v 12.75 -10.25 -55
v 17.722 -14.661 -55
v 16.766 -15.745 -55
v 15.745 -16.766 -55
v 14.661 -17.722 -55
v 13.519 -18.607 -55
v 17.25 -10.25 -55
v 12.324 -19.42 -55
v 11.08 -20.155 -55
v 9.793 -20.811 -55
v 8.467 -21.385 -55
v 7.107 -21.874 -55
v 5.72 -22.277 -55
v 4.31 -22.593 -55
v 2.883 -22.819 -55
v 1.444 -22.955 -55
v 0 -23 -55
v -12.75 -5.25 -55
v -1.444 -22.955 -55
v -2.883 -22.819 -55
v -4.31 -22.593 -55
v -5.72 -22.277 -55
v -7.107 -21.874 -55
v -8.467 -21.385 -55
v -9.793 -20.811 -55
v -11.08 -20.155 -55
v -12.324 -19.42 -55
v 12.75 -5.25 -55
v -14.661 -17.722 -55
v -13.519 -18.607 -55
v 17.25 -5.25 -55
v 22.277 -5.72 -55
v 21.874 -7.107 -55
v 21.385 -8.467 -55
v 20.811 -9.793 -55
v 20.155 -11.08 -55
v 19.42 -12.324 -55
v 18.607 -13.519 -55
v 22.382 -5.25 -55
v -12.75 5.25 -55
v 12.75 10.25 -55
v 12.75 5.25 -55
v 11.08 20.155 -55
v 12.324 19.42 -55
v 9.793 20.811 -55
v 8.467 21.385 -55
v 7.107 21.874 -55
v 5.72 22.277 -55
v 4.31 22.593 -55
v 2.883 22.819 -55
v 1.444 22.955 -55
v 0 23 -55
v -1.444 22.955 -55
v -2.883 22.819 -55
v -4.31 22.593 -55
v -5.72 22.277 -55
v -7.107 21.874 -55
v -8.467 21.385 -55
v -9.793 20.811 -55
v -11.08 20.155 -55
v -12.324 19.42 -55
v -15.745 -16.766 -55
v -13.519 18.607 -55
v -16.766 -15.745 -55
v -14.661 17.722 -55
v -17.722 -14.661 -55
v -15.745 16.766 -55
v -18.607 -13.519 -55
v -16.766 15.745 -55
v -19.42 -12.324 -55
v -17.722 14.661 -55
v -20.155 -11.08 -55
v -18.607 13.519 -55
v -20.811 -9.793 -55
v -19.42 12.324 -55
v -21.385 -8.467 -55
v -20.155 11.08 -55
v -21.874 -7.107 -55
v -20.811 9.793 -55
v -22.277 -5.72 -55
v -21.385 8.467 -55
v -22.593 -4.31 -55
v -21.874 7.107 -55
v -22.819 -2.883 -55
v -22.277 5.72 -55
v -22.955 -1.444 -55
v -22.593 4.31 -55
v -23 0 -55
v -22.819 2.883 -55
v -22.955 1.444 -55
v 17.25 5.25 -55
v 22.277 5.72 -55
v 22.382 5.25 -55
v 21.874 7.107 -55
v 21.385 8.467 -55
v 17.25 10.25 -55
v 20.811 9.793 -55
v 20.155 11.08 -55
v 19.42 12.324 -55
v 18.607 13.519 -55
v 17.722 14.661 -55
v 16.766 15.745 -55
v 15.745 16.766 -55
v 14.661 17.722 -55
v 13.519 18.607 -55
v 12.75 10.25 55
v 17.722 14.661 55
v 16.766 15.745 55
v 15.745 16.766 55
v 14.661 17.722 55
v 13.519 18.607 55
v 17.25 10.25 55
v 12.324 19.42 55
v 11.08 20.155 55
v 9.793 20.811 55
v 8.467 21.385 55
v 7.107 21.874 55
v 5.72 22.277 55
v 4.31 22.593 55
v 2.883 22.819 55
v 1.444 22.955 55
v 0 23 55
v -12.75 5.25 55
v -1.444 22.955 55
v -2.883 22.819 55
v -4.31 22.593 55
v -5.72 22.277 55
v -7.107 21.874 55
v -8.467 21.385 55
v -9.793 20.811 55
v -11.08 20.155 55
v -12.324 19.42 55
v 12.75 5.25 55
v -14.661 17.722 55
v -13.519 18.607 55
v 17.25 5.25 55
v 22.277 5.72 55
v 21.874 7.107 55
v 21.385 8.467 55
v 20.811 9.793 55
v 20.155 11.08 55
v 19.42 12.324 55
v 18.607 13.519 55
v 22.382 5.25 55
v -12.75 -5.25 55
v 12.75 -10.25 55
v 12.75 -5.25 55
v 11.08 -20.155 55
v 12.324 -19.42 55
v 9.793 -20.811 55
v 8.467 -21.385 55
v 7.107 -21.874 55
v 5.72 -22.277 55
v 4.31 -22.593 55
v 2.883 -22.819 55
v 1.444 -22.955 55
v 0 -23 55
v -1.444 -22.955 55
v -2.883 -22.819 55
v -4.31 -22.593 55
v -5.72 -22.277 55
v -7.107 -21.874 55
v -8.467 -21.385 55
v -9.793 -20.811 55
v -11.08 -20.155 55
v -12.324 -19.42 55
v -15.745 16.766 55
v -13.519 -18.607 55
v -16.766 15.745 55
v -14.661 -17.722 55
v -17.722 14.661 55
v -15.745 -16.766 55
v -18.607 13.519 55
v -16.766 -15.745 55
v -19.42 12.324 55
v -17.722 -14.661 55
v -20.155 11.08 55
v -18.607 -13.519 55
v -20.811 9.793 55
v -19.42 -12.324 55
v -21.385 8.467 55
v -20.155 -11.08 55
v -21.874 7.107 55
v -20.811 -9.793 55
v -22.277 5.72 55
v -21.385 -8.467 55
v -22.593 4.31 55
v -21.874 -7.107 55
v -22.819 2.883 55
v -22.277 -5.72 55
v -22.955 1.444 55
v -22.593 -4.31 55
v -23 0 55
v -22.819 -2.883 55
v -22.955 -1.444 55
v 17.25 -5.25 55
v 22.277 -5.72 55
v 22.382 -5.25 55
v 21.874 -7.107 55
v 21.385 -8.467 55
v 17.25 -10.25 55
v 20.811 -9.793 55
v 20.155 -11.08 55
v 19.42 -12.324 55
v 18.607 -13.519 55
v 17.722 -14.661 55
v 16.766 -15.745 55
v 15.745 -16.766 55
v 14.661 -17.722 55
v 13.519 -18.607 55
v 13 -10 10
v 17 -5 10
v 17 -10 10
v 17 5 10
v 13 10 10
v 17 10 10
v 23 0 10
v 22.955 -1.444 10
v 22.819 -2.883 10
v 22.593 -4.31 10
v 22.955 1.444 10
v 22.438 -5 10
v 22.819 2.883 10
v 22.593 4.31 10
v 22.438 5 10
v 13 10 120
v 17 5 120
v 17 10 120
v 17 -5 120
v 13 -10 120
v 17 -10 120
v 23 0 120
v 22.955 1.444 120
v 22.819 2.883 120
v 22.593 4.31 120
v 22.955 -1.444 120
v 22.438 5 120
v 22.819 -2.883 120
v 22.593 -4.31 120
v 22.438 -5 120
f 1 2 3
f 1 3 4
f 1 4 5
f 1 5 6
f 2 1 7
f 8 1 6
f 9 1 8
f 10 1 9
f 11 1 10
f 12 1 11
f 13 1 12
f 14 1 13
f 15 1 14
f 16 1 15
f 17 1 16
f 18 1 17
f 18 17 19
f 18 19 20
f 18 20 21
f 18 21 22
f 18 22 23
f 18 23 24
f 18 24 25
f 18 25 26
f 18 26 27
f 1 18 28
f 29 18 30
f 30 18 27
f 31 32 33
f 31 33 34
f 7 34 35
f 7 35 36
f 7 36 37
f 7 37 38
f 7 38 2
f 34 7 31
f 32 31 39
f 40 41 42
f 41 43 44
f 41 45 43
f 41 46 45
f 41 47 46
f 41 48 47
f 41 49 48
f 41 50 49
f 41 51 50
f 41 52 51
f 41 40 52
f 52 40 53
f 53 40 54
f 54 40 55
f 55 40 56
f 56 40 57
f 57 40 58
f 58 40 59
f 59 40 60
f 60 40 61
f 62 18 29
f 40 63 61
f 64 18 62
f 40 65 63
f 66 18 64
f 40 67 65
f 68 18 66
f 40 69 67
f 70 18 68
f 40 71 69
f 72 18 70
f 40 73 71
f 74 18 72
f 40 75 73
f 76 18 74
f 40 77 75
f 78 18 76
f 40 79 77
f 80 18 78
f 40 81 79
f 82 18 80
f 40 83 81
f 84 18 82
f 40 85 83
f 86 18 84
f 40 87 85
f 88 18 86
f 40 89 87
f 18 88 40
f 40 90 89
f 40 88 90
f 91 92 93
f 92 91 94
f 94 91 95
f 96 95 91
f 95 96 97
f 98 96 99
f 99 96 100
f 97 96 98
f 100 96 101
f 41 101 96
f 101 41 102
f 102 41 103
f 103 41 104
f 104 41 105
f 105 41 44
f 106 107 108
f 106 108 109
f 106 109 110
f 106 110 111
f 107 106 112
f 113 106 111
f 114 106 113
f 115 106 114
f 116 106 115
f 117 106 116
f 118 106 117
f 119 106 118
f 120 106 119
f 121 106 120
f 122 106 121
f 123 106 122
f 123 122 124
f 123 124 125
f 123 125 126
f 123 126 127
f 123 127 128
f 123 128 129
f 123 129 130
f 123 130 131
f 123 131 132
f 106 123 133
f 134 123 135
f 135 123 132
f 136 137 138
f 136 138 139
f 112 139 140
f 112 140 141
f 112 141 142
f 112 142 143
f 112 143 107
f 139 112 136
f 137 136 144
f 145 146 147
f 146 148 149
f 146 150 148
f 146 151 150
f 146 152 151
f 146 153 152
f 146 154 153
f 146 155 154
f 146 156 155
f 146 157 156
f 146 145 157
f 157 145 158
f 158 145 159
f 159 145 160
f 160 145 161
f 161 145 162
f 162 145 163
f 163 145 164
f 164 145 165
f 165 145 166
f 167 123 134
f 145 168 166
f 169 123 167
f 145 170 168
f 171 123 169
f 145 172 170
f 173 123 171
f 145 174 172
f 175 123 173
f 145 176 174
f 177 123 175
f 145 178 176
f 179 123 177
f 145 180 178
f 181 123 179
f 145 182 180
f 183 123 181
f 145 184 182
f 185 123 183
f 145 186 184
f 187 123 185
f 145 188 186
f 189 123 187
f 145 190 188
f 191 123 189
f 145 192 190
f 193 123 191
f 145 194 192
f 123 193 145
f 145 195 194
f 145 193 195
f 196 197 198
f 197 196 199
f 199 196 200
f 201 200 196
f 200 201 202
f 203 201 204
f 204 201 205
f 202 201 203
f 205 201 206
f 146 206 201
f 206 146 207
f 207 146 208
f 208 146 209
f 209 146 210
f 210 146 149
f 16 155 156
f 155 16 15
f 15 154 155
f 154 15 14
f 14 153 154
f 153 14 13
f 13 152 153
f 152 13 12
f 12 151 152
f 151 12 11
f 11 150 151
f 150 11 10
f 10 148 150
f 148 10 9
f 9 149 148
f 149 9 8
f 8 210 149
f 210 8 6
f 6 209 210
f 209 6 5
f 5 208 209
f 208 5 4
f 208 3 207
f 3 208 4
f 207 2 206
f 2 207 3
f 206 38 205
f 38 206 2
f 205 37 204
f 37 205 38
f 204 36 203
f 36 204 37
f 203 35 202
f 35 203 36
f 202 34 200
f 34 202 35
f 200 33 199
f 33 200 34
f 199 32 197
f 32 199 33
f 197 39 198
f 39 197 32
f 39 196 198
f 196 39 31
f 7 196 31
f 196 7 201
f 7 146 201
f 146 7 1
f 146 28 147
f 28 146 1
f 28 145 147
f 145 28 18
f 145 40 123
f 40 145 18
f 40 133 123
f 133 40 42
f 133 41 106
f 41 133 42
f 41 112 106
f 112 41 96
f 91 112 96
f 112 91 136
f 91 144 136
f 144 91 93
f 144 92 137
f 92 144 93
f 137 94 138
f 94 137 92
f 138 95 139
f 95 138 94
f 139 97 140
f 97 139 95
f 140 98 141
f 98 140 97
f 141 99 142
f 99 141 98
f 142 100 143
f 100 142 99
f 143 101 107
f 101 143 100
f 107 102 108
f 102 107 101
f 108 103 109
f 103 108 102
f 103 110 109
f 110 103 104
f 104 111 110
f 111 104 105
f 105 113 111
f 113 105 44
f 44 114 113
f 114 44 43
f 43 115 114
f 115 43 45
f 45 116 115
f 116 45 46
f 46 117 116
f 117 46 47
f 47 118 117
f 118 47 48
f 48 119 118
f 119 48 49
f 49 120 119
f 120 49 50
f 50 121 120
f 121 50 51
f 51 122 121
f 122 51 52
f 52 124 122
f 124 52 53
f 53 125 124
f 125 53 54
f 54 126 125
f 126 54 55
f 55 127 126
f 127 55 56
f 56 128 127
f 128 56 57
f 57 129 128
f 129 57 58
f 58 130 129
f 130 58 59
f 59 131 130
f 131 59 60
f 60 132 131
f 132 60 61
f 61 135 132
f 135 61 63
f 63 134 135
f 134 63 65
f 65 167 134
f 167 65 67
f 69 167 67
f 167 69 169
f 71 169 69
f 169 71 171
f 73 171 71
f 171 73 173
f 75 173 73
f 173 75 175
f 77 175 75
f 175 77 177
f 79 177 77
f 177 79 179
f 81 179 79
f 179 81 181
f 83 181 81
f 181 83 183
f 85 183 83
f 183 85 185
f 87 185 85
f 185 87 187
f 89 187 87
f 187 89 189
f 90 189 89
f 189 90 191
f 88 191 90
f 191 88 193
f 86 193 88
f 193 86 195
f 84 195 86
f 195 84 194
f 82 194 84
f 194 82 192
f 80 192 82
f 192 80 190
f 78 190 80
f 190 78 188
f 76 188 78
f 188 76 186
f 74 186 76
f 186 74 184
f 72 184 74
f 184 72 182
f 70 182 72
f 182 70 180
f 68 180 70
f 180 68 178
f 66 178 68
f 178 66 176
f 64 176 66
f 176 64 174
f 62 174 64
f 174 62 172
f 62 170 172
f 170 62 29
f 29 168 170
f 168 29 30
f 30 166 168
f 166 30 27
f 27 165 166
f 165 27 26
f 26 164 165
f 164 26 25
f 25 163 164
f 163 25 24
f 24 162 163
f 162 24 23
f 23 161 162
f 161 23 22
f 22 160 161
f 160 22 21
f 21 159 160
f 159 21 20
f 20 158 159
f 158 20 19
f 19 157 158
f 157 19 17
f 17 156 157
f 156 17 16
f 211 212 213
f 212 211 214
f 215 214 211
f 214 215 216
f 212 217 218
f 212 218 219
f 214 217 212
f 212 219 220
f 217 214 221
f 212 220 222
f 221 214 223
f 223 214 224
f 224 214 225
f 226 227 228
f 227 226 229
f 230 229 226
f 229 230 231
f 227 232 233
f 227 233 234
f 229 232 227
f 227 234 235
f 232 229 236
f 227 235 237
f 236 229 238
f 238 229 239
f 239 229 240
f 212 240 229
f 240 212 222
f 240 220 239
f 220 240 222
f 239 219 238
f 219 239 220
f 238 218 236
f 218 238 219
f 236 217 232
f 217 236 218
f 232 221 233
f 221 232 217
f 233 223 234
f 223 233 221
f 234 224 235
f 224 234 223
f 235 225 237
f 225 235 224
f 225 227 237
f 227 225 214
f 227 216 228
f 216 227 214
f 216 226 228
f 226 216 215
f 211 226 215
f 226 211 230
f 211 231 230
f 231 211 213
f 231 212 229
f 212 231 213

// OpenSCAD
// --- Horizontal Sliding T-Track Clamshell Grip ---
// All dimensions in millimeters (mm)

// --- Which part to render? ---
// Options: "assembled", "u_piece", "t_piece"
render_part = "assembled"; 

// --- 1. Core Dimensions ---
bar_width = 25;   // The flat edge (horizontal)
bar_height = 10;  // The short edge (vertical/front)
grip_length = 110;
//grip_length = 25;
outer_diameter = 46;

// --- 2. Fit & Clearances ---
bar_tol = 0.5;      // Clearance for the metal bar
slide_tol = 0.25;   // Clearance for the sliding T-piece (adjust if too tight/loose)

// Calculated inner channel for the metal bar
inner_w = bar_width + bar_tol;
inner_h = bar_height + bar_tol;
bw = inner_w / 2;
bh = inner_h / 2;

// --- 3. Horizontal T-Track Dimensions ---
// The dovetail grooves now expand vertically on the front (short) edge
wing_top = bh + 5.0;         // Dovetail wing expands 5mm UP
wing_bottom = -bh - 5.0;     // Dovetail wing expands 5mm DOWN
wing_outer_x = bw + 4.5;     // Wing extends 4.5mm outward

// --- Rendering Logic ---
if (render_part == "assembled") {
    color("dodgerblue") u_piece_3d();
    // Slides the T-piece halfway out along the Z-axis to show the lock
    color("darkorange") translate([0, 0, grip_length/2 + 10]) t_piece_3d();
} else if (render_part == "u_piece") {
    u_piece_3d();
} else if (render_part == "t_piece") {
    t_piece_3d();
}

// --- Modules ---
module u_piece_3d() {
    linear_extrude(height=grip_length, center=true)
    difference() {
        circle(d=outer_diameter, $fn=100);
        
        // The perfectly symmetric horizontal cutout for the bar AND the T-track
        polygon(points=[
            [-bw, bh],                  // Top-left of the metal bar cavity
            [bw, bh],                   // Top-right of the metal bar (starts T-track)
            [bw, wing_top],             // Up into top wing
            [wing_outer_x, wing_top],   // Right along top wing
            [wing_outer_x, bh],         // Down to the neck opening
            [outer_diameter, bh],       // Right to exterior (blows out the side)
            [outer_diameter, -bh],      // Down across the front neck opening
            [wing_outer_x, -bh],        // Left along bottom neck
            [wing_outer_x, wing_bottom],// Down into bottom wing
            [bw, wing_bottom],          // Left along bottom wing
            [bw, -bh],                  // Up to bottom-right of metal bar
            [-bw, -bh]                  // Left to bottom-left of metal bar
        ]);
    }
}

module t_piece_3d() {
    // Tolerances applied inward for a smooth sliding fit
    bw_t = bw + slide_tol;            // Left inner face
    wt_t = wing_top - slide_tol;      // Top of top wing
    wb_t = wing_bottom + slide_tol;   // Bottom of bottom wing
    wox_t = wing_outer_x - slide_tol; // Right edge of wings
    nt_t = bh - slide_tol;            // Top of front neck
    nb_t = -bh + slide_tol;           // Bottom of front neck
    
    linear_extrude(height=grip_length, center=true)
    intersection() {
        circle(d=outer_diameter, $fn=100);
        
        // The solid, perfectly symmetric horizontal T-piece
        polygon(points=[
            [bw_t, nt_t],
            [bw_t, wt_t],
            [wox_t, wt_t],
            [wox_t, nt_t],
            [outer_diameter, nt_t],
            [outer_diameter, nb_t],
            [wox_t, nb_t],
            [wox_t, wb_t],
            [bw_t, wb_t],
            [bw_t, nb_t]
        ]);
    }
}
